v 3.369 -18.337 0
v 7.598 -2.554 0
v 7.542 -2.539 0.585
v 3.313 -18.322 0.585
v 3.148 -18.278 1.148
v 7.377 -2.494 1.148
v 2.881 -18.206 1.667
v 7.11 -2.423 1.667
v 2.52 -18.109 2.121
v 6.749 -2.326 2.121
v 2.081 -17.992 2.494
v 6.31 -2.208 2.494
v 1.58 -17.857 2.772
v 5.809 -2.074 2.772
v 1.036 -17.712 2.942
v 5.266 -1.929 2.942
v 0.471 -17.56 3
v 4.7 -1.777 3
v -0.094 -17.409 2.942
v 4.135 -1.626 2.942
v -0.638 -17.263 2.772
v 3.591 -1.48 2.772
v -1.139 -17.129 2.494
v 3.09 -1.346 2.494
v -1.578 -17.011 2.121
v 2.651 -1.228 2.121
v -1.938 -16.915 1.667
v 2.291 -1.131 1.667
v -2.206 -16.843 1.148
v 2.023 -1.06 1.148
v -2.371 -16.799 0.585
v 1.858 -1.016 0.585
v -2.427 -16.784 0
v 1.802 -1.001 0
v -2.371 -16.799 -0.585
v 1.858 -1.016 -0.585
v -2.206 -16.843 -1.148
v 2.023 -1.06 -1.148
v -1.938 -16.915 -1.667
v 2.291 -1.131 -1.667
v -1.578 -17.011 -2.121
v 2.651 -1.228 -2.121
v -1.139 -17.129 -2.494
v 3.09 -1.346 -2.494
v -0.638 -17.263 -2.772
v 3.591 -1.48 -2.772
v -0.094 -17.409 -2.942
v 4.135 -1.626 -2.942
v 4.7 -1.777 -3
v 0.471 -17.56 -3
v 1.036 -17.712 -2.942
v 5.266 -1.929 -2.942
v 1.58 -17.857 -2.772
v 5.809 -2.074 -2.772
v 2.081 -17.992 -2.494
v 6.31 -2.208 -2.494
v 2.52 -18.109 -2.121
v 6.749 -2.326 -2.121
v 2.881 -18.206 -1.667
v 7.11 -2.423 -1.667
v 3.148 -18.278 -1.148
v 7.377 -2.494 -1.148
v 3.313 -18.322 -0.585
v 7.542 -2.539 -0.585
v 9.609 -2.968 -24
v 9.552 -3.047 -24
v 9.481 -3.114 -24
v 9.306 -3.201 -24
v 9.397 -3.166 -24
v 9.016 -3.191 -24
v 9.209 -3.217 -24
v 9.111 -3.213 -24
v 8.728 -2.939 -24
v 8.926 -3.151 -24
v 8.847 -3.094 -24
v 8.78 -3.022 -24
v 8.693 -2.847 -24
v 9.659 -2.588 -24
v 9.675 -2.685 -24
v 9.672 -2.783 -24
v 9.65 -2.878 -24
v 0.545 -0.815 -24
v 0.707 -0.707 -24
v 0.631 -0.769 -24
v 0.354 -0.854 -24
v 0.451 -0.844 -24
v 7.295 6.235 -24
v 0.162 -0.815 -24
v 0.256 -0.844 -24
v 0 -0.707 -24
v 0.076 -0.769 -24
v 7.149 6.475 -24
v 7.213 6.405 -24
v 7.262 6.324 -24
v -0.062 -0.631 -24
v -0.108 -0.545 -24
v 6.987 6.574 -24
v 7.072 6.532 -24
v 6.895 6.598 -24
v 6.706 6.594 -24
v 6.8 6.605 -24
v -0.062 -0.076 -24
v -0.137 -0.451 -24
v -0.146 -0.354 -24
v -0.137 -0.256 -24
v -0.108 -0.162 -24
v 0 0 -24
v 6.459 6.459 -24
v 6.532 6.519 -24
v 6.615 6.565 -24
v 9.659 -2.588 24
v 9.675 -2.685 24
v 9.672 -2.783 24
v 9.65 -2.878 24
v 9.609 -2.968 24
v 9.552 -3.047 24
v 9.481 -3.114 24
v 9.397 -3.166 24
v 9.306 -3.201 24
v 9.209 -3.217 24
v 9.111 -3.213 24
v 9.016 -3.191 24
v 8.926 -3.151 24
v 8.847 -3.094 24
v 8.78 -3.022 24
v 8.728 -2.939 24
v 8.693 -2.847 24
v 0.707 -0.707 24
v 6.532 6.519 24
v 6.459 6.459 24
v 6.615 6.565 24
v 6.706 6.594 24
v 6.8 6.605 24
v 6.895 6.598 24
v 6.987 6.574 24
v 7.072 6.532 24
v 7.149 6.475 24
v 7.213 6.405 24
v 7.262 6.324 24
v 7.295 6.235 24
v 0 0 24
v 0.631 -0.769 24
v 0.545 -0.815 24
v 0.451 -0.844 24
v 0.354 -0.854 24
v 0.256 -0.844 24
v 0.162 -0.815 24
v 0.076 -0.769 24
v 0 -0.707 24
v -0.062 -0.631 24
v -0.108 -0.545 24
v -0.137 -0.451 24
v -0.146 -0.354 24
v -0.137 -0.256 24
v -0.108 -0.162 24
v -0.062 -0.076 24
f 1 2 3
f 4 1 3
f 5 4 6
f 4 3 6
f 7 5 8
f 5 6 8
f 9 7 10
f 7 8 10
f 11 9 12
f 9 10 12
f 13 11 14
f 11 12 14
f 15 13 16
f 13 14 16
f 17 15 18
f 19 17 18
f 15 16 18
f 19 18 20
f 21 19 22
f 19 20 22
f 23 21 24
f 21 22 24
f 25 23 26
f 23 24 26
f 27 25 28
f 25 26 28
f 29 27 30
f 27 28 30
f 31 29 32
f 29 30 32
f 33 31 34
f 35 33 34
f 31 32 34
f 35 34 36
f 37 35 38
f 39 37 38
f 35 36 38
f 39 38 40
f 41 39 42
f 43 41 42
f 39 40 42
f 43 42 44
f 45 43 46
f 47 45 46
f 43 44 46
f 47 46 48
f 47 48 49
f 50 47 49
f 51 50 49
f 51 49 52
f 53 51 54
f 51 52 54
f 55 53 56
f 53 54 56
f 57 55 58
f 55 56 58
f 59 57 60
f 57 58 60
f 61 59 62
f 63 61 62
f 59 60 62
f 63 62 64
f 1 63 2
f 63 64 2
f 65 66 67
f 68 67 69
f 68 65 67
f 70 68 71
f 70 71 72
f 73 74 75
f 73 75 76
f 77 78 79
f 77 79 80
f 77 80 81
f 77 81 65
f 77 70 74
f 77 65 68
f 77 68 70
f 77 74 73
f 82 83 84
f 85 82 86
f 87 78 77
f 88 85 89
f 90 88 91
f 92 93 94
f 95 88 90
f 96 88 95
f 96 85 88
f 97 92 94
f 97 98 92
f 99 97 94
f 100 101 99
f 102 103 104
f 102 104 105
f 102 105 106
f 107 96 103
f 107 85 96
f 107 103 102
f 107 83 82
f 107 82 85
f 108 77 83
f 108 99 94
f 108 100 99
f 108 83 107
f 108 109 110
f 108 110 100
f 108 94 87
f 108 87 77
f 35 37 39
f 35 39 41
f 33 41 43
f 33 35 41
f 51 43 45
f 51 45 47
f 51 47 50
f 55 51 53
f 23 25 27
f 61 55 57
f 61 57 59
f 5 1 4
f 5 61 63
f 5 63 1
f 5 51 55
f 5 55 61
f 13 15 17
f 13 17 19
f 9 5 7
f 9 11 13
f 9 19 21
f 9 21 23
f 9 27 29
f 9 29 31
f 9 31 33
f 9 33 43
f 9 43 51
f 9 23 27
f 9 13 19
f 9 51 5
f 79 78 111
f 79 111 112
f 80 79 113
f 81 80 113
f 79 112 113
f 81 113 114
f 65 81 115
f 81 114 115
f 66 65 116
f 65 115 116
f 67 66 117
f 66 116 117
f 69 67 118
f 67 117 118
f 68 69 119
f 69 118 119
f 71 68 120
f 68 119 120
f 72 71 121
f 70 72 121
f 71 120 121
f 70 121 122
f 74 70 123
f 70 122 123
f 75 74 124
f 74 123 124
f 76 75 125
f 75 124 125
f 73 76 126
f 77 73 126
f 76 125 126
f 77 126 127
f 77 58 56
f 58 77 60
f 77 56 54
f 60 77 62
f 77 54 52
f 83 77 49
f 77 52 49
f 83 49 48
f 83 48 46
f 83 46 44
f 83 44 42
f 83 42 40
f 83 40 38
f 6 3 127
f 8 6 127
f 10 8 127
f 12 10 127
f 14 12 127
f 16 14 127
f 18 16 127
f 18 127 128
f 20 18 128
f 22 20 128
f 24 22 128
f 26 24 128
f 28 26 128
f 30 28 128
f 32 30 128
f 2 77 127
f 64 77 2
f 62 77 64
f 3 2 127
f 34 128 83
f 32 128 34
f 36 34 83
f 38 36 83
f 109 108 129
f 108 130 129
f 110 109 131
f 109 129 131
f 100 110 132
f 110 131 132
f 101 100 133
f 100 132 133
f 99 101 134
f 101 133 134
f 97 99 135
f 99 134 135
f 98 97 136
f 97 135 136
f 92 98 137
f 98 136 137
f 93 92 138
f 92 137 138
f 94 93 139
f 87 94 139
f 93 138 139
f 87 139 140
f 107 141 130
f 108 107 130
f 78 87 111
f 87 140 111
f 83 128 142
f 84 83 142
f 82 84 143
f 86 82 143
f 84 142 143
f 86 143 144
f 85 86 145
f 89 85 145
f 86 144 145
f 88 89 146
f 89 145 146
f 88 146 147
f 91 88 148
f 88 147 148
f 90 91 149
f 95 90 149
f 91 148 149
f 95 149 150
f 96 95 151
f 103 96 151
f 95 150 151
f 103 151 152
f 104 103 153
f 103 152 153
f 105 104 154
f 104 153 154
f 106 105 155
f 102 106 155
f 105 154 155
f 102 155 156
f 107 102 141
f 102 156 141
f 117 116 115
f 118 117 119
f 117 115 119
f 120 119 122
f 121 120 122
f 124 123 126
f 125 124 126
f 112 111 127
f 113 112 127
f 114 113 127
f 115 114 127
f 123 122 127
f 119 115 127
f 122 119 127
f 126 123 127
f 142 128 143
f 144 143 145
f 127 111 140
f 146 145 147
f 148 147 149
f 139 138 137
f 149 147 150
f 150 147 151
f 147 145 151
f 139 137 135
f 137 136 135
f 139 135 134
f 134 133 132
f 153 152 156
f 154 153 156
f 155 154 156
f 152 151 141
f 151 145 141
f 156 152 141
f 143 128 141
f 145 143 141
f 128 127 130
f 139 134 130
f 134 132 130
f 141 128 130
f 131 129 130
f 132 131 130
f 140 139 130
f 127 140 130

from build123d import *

# Parameters (mm, degrees)
BOSS_EXTRUDE1_DEPTH = 24
BOSS_EXTRUDE2_DEPTH = 48
SKETCH3_R           = 3
BOSS_EXTRUDE3_DEPTH = 16.34


with BuildPart() as part:
    # Sketch1 → Boss-Extrude1 (new, symmetric)
    with BuildSketch(Plane.XY):
        with BuildLine():
            Line((0, 0), (6.458695376, 6.458695376))
            ThreePointArc((6.458695376, 6.458695376), (6.941658289, 6.588104899), (7.29521168, 6.234551508))
            Line((7.29521168, 6.234551508), (9.659258263, -2.588190451))
            ThreePointArc((9.659258263, -2.588190451), (9.305704872, -3.200562887), (8.693332437, -2.847009496))
            Line((8.693332437, -2.847009496), (6.77757359, 4.302699856))
            ThreePointArc((6.77757359, 4.302699856), (6.424020199, 4.656253246), (5.941057286, 4.526843724))
            Line((5.941057286, 4.526843724), (0.707106781, -0.707106781))
            ThreePointArc((0.707106781, -0.707106781), (0, -0.707106781), (0, 0))
        make_face()
    extrude(amount=BOSS_EXTRUDE1_DEPTH, both=True)

    # Sketch2 → Boss-Extrude2 (add)
    with BuildSketch(Plane.XY.offset(24)):
        with BuildLine():
            Line((0.707106781, -0.707106781), (5.941057286, 4.526843724))
            ThreePointArc((5.941057286, 4.526843724), (6.424020199, 4.656253246), (6.77757359, 4.302699856))
            Line((6.77757359, 4.302699856), (8.693332437, -2.847009496))
            Line((8.693332437, -2.847009496), (0.707106781, -0.707106781))
        make_face()
    extrude(amount=-BOSS_EXTRUDE2_DEPTH)

    # Sketch3 → Boss-Extrude3 (add)
    with BuildSketch(Plane(origin=(-0.129409523, -0.482962913, 0), x_dir=(0.9659258262890683, -0.25881904510252096, 0), z_dir=(-0.25881904510252096, -0.9659258262890683, 0))):
        with Locations((5, 0)):
            Circle(SKETCH3_R)
    extrude(amount=BOSS_EXTRUDE3_DEPTH)


solid = part.part
